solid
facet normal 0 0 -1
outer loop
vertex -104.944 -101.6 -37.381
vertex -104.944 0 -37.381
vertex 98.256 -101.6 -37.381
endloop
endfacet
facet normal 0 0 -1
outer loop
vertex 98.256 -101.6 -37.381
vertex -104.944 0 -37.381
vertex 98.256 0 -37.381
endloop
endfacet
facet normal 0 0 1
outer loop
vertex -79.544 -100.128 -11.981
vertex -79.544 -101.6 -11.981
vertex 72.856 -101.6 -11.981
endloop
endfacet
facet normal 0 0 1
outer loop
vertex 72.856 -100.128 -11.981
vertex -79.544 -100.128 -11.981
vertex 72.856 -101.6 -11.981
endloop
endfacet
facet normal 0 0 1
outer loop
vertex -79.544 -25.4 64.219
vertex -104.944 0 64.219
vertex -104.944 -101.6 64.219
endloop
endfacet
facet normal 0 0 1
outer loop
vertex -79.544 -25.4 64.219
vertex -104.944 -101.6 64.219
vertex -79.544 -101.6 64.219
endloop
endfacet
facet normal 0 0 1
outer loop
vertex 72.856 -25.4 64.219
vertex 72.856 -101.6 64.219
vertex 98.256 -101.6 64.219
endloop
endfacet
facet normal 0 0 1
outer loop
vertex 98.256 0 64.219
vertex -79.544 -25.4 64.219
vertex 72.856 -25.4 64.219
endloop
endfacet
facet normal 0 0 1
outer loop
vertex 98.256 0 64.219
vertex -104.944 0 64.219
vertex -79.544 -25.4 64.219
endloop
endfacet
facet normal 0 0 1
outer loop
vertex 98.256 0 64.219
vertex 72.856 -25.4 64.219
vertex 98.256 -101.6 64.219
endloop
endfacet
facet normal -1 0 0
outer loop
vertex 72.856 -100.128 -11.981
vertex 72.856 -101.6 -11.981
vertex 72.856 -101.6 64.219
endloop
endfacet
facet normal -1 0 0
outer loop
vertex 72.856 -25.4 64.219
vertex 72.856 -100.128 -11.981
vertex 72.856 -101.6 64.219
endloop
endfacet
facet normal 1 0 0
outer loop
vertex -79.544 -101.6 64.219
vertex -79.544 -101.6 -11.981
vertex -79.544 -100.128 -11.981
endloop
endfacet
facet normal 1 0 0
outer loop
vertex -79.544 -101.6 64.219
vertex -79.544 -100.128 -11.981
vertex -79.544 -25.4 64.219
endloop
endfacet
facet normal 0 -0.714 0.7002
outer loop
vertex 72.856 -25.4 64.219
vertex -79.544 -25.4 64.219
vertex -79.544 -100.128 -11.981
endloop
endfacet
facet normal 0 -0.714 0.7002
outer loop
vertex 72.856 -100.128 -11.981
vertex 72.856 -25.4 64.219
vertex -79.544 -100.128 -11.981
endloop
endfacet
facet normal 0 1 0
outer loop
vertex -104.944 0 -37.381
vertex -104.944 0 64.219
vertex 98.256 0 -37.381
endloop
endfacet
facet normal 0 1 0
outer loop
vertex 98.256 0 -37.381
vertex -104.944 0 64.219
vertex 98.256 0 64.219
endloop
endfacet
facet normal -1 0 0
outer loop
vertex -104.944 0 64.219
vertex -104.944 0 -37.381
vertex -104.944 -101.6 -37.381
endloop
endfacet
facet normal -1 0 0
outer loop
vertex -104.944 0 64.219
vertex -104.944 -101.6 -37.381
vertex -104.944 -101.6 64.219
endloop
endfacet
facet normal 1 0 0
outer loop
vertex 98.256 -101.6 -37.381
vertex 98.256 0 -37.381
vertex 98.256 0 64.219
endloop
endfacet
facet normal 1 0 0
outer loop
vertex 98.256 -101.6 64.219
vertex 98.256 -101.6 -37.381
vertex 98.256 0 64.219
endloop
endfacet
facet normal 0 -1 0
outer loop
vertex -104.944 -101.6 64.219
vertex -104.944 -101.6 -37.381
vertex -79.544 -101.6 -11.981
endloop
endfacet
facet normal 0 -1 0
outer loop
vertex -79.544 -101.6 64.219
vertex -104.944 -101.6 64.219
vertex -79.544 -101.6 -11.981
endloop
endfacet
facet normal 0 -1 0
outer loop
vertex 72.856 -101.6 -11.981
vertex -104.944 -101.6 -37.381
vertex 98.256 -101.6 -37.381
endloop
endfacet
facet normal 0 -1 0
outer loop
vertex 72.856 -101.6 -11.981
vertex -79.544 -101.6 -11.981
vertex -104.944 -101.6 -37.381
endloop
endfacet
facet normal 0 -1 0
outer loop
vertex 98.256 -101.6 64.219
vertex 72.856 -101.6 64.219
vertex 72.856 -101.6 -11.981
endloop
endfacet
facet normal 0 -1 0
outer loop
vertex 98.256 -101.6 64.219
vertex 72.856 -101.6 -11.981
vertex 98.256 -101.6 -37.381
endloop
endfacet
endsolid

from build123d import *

# Parameters (mm, degrees)
F0_W     = 203.2
F0_H     = 101.6
F1_DEPTH = 101.6
F2_W     = 152.4
F2_H     = 76.2
F3_DEPTH = 76.2
F5_DEPTH = 152.4


with BuildPart() as f1:
    # F0 (on Front) → F1 (new body)
    with BuildSketch(Plane.XZ):
        with Locations((-3.343664, 13.419016)):
            Rectangle(F0_W, F0_H)
    extrude(amount=F1_DEPTH)

    # F2 (on face) → F3 (cut)
    with BuildSketch(Plane.XZ.offset(101.6)):
        with Locations((-3.343664, 26.119016)):
            Rectangle(F2_W, F2_H)
    extrude(amount=-F3_DEPTH, mode=Mode.SUBTRACT)

    # F4 (on face) → F5 (join)
    with BuildSketch(Plane.YZ.offset(-79.543664)):
        Polygon((-25.4, -11.980984), (-25.4, 64.219016), (-100.127868, -11.980984), align=None)
    extrude(amount=F5_DEPTH)


solid = f1.part
